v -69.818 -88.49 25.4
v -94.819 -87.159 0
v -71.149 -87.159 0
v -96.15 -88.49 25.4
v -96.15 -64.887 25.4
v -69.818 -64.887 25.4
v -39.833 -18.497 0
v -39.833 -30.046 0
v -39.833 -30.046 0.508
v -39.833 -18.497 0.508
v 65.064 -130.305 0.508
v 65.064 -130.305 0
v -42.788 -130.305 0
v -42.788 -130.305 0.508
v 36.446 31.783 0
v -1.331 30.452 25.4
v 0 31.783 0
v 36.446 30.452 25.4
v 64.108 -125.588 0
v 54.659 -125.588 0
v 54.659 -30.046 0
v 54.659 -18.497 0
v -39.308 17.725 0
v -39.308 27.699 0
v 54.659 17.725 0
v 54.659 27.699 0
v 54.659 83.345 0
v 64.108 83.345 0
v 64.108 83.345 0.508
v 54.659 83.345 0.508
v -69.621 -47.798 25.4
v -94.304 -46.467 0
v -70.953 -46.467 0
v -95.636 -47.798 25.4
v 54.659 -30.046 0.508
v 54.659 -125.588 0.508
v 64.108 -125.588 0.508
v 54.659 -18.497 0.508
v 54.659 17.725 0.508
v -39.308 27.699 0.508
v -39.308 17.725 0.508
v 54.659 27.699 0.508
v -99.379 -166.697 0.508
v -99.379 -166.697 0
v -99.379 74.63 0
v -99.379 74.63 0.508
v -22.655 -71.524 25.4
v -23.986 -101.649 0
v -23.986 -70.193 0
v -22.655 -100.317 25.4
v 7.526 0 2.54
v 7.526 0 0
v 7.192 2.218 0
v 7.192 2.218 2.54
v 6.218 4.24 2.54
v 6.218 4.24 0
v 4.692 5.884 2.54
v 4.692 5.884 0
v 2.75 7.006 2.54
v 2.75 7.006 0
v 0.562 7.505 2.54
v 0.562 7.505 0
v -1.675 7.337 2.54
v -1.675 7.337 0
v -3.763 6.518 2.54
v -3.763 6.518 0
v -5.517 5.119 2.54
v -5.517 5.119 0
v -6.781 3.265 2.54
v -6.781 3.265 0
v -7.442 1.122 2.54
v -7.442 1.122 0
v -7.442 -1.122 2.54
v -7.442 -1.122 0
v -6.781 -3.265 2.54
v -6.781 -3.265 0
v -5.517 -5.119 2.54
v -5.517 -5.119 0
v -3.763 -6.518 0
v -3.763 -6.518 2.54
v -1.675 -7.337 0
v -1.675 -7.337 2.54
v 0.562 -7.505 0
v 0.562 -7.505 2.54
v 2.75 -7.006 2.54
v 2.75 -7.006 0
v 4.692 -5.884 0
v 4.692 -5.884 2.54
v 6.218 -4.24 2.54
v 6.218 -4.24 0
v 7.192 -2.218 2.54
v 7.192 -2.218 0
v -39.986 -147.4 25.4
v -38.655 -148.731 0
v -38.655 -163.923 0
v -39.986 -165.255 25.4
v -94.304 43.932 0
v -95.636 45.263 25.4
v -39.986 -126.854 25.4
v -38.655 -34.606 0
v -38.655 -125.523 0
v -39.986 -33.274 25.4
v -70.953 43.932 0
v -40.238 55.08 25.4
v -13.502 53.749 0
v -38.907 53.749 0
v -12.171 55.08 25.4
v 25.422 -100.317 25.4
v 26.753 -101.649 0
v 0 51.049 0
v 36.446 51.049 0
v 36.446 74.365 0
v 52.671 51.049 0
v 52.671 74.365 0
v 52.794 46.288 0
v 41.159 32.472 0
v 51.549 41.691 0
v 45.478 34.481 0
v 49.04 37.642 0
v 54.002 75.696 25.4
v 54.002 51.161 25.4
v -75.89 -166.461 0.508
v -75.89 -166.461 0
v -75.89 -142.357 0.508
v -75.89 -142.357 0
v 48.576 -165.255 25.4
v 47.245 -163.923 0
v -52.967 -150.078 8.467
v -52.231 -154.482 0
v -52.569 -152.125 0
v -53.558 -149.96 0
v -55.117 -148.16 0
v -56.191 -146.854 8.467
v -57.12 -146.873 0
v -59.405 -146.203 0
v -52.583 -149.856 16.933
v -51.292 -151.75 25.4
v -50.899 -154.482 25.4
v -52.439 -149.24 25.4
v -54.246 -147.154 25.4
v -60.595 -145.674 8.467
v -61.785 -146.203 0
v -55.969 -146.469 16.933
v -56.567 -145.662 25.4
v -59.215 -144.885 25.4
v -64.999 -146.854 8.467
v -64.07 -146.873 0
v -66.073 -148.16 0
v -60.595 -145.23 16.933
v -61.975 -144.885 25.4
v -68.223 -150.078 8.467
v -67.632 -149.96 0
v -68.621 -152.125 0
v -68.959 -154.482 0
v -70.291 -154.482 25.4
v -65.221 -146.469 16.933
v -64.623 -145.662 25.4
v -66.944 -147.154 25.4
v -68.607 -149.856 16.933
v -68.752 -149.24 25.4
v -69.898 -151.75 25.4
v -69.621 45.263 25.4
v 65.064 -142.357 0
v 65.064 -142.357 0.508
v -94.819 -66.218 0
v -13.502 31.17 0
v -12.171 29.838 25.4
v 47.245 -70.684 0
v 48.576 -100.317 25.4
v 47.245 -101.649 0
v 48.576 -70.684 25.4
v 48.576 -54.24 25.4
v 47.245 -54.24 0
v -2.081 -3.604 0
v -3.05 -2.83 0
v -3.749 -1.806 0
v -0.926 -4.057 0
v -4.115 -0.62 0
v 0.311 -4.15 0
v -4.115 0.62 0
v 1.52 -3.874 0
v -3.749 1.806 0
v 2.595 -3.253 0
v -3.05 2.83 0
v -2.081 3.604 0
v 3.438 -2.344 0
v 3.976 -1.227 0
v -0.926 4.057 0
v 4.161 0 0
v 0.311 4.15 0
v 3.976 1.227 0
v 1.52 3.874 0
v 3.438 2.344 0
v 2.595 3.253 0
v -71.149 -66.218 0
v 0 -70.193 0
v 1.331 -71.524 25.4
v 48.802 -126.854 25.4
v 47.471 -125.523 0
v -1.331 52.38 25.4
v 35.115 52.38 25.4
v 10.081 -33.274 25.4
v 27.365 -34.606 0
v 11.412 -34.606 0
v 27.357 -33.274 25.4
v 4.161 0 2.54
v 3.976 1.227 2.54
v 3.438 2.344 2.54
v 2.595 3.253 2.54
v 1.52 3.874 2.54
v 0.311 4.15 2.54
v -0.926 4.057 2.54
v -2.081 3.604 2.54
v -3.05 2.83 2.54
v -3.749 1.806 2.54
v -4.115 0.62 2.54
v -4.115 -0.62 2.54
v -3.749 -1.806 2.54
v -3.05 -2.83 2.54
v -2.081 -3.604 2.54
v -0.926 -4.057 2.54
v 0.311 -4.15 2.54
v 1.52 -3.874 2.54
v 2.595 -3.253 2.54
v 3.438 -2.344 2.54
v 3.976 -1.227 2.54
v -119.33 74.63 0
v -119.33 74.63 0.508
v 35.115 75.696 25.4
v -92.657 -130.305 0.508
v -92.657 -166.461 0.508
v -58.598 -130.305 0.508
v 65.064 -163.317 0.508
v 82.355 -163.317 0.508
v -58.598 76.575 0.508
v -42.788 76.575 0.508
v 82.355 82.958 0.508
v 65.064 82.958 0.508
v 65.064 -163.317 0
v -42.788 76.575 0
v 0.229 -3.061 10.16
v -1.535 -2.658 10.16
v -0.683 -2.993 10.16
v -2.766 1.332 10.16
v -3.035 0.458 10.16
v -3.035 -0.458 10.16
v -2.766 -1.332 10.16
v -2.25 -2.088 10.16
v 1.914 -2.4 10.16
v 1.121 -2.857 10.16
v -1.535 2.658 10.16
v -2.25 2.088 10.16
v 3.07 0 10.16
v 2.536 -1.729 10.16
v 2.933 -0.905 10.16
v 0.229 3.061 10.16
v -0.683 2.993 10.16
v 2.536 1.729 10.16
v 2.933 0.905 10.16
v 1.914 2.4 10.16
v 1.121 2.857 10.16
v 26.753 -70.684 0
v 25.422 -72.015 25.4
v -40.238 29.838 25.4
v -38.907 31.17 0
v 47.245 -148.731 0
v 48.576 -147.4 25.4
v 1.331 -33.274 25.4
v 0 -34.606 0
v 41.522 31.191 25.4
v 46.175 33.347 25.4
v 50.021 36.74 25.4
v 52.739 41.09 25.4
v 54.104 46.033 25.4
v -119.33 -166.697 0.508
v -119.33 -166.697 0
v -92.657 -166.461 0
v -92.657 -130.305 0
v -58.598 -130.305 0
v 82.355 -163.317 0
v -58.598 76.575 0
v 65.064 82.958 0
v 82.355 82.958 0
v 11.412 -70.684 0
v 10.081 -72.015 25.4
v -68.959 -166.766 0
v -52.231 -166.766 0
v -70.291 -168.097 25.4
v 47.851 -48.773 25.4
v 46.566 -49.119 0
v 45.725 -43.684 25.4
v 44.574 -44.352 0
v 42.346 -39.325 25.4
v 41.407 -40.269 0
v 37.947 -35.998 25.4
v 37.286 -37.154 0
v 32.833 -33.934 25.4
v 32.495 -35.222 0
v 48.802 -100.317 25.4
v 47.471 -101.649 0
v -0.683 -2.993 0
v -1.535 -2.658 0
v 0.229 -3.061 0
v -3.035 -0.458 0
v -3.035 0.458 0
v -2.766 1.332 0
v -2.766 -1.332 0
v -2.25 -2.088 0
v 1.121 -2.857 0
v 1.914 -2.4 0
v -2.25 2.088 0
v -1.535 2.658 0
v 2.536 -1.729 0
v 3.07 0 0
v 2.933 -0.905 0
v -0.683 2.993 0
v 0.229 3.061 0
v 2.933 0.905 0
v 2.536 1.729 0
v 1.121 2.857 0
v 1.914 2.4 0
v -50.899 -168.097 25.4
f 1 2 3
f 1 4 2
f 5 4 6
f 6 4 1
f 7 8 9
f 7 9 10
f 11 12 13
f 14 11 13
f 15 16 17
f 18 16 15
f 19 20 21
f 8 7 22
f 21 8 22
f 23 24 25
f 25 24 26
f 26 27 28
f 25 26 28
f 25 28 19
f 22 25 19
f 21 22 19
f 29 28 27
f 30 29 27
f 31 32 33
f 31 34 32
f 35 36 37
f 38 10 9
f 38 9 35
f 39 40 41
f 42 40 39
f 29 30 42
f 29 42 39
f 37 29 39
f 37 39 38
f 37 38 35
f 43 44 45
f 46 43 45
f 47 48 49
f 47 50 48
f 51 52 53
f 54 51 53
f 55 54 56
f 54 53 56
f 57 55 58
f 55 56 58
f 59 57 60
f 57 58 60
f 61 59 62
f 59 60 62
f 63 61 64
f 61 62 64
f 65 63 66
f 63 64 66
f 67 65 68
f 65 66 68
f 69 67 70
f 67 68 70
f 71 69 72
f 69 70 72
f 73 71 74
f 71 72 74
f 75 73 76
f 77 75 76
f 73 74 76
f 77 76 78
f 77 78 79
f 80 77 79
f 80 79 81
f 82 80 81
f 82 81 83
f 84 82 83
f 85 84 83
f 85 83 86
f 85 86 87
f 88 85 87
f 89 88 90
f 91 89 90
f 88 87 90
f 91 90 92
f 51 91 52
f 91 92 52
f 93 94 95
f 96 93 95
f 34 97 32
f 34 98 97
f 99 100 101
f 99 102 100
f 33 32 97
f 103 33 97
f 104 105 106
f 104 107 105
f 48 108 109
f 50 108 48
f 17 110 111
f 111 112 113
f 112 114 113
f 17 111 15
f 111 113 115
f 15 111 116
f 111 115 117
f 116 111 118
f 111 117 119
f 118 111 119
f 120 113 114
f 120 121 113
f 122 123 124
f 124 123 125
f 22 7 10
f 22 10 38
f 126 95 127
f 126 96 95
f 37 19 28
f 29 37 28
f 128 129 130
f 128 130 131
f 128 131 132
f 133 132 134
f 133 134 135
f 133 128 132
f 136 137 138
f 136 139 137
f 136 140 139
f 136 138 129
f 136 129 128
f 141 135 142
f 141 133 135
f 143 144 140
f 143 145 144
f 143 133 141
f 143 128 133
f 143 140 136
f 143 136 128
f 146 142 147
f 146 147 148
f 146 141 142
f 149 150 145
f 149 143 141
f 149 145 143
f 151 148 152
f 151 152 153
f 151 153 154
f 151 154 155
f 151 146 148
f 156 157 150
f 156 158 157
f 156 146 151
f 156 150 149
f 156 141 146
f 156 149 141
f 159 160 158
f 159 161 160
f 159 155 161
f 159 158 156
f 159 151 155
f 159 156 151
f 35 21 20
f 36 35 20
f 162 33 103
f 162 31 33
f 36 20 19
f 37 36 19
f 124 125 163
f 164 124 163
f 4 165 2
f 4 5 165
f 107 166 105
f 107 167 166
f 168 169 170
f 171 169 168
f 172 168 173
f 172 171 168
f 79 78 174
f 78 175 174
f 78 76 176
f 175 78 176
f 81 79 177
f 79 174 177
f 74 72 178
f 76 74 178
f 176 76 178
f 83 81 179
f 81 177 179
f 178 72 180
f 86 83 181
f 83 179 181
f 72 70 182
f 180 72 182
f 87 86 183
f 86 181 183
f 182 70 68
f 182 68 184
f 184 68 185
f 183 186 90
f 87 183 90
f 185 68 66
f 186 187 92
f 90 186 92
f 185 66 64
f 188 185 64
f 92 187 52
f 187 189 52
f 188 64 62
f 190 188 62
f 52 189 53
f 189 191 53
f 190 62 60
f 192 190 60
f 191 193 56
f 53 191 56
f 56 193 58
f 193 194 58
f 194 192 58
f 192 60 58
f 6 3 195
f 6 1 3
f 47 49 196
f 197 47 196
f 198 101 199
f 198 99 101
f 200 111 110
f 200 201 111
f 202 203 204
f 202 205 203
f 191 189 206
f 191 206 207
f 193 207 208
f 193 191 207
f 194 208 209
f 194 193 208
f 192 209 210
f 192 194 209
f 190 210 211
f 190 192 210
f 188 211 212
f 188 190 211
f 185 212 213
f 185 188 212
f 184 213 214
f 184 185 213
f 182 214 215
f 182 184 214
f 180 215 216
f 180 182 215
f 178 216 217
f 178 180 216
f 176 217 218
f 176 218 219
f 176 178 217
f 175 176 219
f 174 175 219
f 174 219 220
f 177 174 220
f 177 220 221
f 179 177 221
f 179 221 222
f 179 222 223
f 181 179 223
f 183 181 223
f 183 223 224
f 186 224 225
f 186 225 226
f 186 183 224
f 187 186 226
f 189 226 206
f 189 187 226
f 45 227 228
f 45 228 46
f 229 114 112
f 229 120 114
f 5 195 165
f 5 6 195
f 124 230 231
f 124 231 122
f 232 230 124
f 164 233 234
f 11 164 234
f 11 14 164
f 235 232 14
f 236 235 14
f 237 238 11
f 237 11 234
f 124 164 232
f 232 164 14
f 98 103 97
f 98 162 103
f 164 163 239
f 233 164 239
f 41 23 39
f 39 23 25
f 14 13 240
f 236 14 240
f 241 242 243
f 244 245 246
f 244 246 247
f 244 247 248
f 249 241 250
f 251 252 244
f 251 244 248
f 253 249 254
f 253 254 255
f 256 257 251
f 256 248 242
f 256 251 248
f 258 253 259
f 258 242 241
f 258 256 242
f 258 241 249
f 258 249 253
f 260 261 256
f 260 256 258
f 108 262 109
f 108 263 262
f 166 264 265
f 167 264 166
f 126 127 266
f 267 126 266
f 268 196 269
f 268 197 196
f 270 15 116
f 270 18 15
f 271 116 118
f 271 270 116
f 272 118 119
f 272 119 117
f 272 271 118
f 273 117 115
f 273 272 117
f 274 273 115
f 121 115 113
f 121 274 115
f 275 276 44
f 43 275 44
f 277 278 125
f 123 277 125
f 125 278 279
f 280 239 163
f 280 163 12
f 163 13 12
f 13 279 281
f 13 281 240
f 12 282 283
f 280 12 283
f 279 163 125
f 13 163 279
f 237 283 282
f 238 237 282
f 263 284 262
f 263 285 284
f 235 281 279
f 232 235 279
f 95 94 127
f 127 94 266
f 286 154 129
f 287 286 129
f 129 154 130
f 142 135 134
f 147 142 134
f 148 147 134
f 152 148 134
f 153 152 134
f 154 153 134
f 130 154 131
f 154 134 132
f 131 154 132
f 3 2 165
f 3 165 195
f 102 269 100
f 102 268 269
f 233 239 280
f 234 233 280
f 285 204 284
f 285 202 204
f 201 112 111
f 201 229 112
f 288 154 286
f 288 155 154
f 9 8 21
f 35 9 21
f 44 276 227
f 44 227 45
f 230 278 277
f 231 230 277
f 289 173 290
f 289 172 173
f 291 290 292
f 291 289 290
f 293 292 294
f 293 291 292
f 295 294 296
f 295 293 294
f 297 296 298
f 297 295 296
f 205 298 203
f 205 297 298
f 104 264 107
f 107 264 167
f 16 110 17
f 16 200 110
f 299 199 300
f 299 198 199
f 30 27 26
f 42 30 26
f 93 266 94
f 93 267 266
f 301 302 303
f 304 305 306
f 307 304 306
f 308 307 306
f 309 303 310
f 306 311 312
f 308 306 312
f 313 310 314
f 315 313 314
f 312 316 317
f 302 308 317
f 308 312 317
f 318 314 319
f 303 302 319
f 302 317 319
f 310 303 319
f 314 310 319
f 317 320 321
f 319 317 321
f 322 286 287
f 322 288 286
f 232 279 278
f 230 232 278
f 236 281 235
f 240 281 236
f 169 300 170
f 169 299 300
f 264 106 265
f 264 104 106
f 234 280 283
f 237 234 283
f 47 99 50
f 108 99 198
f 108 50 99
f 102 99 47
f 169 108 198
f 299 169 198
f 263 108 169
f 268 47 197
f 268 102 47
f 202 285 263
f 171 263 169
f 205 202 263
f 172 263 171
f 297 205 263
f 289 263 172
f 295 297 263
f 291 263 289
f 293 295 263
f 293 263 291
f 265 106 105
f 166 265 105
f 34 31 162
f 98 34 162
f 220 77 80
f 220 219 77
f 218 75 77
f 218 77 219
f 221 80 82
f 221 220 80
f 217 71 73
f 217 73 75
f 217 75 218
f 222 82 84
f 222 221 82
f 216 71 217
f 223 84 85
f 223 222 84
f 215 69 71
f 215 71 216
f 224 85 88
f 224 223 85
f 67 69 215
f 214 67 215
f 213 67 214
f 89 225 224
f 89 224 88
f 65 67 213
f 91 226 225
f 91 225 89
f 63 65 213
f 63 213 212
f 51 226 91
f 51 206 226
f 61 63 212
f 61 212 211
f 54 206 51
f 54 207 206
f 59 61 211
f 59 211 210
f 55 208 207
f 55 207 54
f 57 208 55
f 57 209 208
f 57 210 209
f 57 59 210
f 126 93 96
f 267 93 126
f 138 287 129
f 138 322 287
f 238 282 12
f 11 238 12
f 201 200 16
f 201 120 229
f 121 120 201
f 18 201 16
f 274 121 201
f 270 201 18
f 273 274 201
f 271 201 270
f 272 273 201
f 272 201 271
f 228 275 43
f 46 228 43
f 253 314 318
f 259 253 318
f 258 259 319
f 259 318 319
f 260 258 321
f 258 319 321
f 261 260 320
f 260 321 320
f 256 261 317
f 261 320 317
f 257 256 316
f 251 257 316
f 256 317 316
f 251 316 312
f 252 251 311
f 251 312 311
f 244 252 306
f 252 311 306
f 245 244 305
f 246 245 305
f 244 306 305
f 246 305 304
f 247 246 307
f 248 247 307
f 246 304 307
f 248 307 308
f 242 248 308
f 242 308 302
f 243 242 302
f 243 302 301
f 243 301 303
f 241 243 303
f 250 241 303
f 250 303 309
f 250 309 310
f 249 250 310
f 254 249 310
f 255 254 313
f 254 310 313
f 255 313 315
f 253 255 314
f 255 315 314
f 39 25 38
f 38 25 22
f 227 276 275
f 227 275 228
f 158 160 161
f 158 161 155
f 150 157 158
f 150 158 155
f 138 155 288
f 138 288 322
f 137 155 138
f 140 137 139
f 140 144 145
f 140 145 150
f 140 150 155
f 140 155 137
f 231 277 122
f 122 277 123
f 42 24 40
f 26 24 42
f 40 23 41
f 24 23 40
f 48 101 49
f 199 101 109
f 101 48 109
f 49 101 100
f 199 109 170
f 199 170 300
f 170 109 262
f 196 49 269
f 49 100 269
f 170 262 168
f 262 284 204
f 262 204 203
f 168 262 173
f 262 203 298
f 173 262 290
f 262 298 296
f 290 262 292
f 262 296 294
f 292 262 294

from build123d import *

# Parameters (mm, degrees)
F0_W     = 25.4052998498
F0_H     = 22.5795097649
F1_DEPTH = 25.4
F1_TAPER = -3
F0_W_2   = 16.2246452776
F0_H_2   = 23.3158059418
F0_W_3   = 36.446288228
F0_H_3   = 19.2662030458
F0_W_4   = 23.3518372697
F0_H_4   = 90.399030596
F0_W_5   = 19.8797881603
F0_H_5   = 16.4437703788
F0_W_6   = 85.900310427
F0_H_6   = 15.1923596859
F0_W_7   = 16.728913189
F0_H_7   = 12.2842788696
F0_W_8   = 23.6697942019
F0_H_8   = 20.9412574768
F2_W     = 15.8104561269
F2_H     = 206.8802822016
F2_W_2   = 16.7676582932
F2_H_2   = 24.1035223007
F3_DEPTH = 0.508
F2_W_3   = 19.9504420161
F2_H_3   = 241.3269877434
F4_R     = 7.5261335965
F4_R_2   = 4.1613128117
F6_DEPTH = 2.54
F5_R     = 3.0696818441
F7_DEPTH = 10.16
F8_W     = 93.9673818648
F8_H     = 9.9741909653
F8_W_2   = 5.2495710552
F8_W_3   = 94.4923385978
F8_H_2   = 11.5490630269
F9_DEPTH = 0.508


with BuildPart() as f1:
    # F0 (on Top) → F1 (new body)
    with BuildSketch(Plane.XY):
        with Locations((-26.2046209536, 42.4592960626)):
            Rectangle(F0_W, F0_H)
    extrude(amount=F1_DEPTH, taper=F1_TAPER)


with BuildPart() as f1b:
    # F0 (on Top) → F1, piece 2 (new body)
    with BuildSketch(Plane.XY):
        with Locations((44.5586108668, 62.7072211355)):
            Rectangle(F0_W_2, F0_H_2)
        with Locations((18.223144114, 41.4162166417)):
            Rectangle(F0_W_3, F0_H_3)
        with BuildLine():
            Line((52.6709335056, 51.0493181646), (36.446288228, 51.0493181646))
            Line((36.446288228, 51.0493181646), (36.446288228, 31.7831151187))
            ThreePointArc((36.446288228, 31.7831151187), (49.0401924498, 37.6421428767), (52.6709335056, 51.0493181646))
        make_face()
    extrude(amount=F1_DEPTH, taper=F1_TAPER)


with BuildPart() as f1c:
    # F0 (on Top) → F1, piece 3 (new body)
    with BuildSketch(Plane.XY):
        with Locations((-82.6284939685, -1.2676436454)):
            Rectangle(F0_W_4, F0_H_4)
    extrude(amount=F1_DEPTH, taper=F1_TAPER)


with BuildPart() as f1d:
    # F0 (on Top) → F1, piece 4 (new body)
    with BuildSketch(Plane.XY):
        Polygon((0, -34.605551511), (-38.6551395059, -34.605551511), (-38.6551395059, -70.1928213239), (-23.9862054586, -70.1928213239), (0, -70.1928213239), align=None)
        Polygon((-23.9862054586, -70.1928213239), (-38.6551395059, -70.1928213239), (-38.6551395059, -125.5229115486), (-23.9862054586, -125.5229115486), (-23.9862054586, -101.6486436129), align=None)
        Polygon((26.7531871796, -101.6486436129), (-23.9862054586, -101.6486436129), (-23.9862054586, -125.5229115486), (47.4710874259, -125.5229115486), (47.4710874259, -101.6486436129), (47.2451709211, -101.6486436129), align=None)
        Polygon((26.7531871796, -70.6836804748), (26.7531871796, -101.6486436129), (47.2451709211, -101.6486436129), (47.2451709211, -70.6836804748), (27.3653827608, -70.6836804748), align=None)
        Polygon((11.4124696702, -70.6836804748), (26.7531871796, -70.6836804748), (27.3653827608, -70.6836804748), (27.3653827608, -54.2399100959), (27.3653827608, -34.605551511), (11.4124696702, -34.605551511), align=None)
        with Locations((37.3052768409, -62.4617952853)):
            Rectangle(F0_W_5, F0_H_5)
        with BuildLine():
            Line((27.3653827608, -54.2399100959), (47.2451709211, -54.2399100959))
            ThreePointArc((47.2451709211, -54.2399100959), (41.407450395, -40.2692800606), (27.3653827608, -34.605551511))
            Line((27.3653827608, -34.605551511), (27.3653827608, -54.2399100959))
        make_face()
    extrude(amount=F1_DEPTH, taper=F1_TAPER)


with BuildPart() as f1e:
    # F0 (on Top) → F1, piece 5 (new body)
    with BuildSketch(Plane.XY):
        with Locations((4.2950157076, -156.3271731138)):
            Rectangle(F0_W_6, F0_H_6)
    extrude(amount=F1_DEPTH, taper=F1_TAPER)


with BuildPart() as f1f:
    # F0 (on Top) → F1, piece 6 (new body)
    with BuildSketch(Plane.XY):
        with Locations((-60.5950392783, -160.6239974499)):
            Rectangle(F0_W_7, F0_H_7)
        with BuildLine():
            Line((-68.9594958728, -154.4818580151), (-52.2305826838, -154.4818580151))
            ThreePointArc((-52.2305826838, -154.4818580151), (-60.5950392783, -146.1174014206), (-68.9594958728, -154.4818580151))
        make_face()
    extrude(amount=F1_DEPTH, taper=F1_TAPER)


with BuildPart() as f1g:
    # F0 (on Top) → F1, piece 7 (new body)
    with BuildSketch(Plane.XY):
        with Locations((-82.983635366, -76.6883715987)):
            Rectangle(F0_W_8, F0_H_8)
    extrude(amount=F1_DEPTH, taper=F1_TAPER)


with BuildPart() as f3:
    # F2 (on Top) → F3 (new body)
    with BuildSketch(Plane.XY):
        Polygon((65.0635436177, -130.3054723524), (-42.7875295281, -130.3054723524), (-58.5979856551, -130.3054723524), (-58.5979856551, -142.3572450876), (65.0635436177, -142.3572450876), align=None)
        with Locations((-50.6927575916, -26.8653312515)):
            Rectangle(F2_W, F2_H)
        Polygon((-58.5979856551, -142.3572450876), (-58.5979856551, -130.3054723524), (-92.6573053002, -130.3054723524), (-92.6573053002, -142.3572450876), (-75.889647007, -142.3572450876), align=None)
        Polygon((65.0635436177, 82.9582512379), (65.0635436177, -130.3054723524), (65.0635436177, -142.3572450876), (65.0635436177, -163.3168160915), (82.3552012444, -163.3168160915), (82.3552012444, 82.9582512379), align=None)
        with Locations((-84.2734761536, -154.409006238)):
            Rectangle(F2_W_2, F2_H_2)
    extrude(amount=F3_DEPTH)


with BuildPart() as f3b:
    # F2 (on Top) → F3, piece 2 (new body)
    with BuildSketch(Plane.XY):
        with Locations((-109.3545146286, -46.0334867239)):
            Rectangle(F2_W_3, F2_H_3)
    extrude(amount=F3_DEPTH)


with BuildPart() as f6:
    # F4 (on Top) → F6 (new body)
    with BuildSketch(Plane.XY):
        Circle(F4_R)
        Circle(F4_R_2, mode=Mode.SUBTRACT)
    extrude(amount=F6_DEPTH)


with BuildPart() as f7:
    # F5 (on Top) → F7 (new body)
    with BuildSketch(Plane.XY):
        Circle(F5_R)
    extrude(amount=F7_DEPTH)


with BuildPart() as f9:
    # F8 (on Top) → F9 (new body)
    with BuildSketch(Plane.XY):
        with Locations((7.675556466, 22.7122409269)):
            Rectangle(F8_W, F8_H)
        Polygon((54.6592473984, 83.3448246121), (54.6592473984, 27.6993364096), (59.9088184536, 27.6993364096), (59.9088184536, 17.7251454443), (54.6592473984, 17.7251454443), (54.6592473984, -18.4969175607), (59.9088184536, -18.4969175607), (59.9088184536, -30.0459805876), (54.6592473984, -30.0459805876), (54.6592473984, -125.5882382393), (64.1084834933, -125.5882382393), (64.1084834933, 83.3448246121), align=None)
        with Locations((57.284032926, 22.7122409269)):
            Rectangle(F8_W_2, F8_H)
        with Locations((7.4130780995, -24.2714490741)):
            Rectangle(F8_W_3, F8_H_2)
        with Locations((57.284032926, -24.2714490741)):
            Rectangle(F8_W_2, F8_H_2)
    extrude(amount=F9_DEPTH)


solid = Compound([f1.part, f1b.part, f1c.part, f1d.part, f1e.part, f1f.part, f1g.part, f3.part, f3b.part, f6.part, f7.part, f9.part])
